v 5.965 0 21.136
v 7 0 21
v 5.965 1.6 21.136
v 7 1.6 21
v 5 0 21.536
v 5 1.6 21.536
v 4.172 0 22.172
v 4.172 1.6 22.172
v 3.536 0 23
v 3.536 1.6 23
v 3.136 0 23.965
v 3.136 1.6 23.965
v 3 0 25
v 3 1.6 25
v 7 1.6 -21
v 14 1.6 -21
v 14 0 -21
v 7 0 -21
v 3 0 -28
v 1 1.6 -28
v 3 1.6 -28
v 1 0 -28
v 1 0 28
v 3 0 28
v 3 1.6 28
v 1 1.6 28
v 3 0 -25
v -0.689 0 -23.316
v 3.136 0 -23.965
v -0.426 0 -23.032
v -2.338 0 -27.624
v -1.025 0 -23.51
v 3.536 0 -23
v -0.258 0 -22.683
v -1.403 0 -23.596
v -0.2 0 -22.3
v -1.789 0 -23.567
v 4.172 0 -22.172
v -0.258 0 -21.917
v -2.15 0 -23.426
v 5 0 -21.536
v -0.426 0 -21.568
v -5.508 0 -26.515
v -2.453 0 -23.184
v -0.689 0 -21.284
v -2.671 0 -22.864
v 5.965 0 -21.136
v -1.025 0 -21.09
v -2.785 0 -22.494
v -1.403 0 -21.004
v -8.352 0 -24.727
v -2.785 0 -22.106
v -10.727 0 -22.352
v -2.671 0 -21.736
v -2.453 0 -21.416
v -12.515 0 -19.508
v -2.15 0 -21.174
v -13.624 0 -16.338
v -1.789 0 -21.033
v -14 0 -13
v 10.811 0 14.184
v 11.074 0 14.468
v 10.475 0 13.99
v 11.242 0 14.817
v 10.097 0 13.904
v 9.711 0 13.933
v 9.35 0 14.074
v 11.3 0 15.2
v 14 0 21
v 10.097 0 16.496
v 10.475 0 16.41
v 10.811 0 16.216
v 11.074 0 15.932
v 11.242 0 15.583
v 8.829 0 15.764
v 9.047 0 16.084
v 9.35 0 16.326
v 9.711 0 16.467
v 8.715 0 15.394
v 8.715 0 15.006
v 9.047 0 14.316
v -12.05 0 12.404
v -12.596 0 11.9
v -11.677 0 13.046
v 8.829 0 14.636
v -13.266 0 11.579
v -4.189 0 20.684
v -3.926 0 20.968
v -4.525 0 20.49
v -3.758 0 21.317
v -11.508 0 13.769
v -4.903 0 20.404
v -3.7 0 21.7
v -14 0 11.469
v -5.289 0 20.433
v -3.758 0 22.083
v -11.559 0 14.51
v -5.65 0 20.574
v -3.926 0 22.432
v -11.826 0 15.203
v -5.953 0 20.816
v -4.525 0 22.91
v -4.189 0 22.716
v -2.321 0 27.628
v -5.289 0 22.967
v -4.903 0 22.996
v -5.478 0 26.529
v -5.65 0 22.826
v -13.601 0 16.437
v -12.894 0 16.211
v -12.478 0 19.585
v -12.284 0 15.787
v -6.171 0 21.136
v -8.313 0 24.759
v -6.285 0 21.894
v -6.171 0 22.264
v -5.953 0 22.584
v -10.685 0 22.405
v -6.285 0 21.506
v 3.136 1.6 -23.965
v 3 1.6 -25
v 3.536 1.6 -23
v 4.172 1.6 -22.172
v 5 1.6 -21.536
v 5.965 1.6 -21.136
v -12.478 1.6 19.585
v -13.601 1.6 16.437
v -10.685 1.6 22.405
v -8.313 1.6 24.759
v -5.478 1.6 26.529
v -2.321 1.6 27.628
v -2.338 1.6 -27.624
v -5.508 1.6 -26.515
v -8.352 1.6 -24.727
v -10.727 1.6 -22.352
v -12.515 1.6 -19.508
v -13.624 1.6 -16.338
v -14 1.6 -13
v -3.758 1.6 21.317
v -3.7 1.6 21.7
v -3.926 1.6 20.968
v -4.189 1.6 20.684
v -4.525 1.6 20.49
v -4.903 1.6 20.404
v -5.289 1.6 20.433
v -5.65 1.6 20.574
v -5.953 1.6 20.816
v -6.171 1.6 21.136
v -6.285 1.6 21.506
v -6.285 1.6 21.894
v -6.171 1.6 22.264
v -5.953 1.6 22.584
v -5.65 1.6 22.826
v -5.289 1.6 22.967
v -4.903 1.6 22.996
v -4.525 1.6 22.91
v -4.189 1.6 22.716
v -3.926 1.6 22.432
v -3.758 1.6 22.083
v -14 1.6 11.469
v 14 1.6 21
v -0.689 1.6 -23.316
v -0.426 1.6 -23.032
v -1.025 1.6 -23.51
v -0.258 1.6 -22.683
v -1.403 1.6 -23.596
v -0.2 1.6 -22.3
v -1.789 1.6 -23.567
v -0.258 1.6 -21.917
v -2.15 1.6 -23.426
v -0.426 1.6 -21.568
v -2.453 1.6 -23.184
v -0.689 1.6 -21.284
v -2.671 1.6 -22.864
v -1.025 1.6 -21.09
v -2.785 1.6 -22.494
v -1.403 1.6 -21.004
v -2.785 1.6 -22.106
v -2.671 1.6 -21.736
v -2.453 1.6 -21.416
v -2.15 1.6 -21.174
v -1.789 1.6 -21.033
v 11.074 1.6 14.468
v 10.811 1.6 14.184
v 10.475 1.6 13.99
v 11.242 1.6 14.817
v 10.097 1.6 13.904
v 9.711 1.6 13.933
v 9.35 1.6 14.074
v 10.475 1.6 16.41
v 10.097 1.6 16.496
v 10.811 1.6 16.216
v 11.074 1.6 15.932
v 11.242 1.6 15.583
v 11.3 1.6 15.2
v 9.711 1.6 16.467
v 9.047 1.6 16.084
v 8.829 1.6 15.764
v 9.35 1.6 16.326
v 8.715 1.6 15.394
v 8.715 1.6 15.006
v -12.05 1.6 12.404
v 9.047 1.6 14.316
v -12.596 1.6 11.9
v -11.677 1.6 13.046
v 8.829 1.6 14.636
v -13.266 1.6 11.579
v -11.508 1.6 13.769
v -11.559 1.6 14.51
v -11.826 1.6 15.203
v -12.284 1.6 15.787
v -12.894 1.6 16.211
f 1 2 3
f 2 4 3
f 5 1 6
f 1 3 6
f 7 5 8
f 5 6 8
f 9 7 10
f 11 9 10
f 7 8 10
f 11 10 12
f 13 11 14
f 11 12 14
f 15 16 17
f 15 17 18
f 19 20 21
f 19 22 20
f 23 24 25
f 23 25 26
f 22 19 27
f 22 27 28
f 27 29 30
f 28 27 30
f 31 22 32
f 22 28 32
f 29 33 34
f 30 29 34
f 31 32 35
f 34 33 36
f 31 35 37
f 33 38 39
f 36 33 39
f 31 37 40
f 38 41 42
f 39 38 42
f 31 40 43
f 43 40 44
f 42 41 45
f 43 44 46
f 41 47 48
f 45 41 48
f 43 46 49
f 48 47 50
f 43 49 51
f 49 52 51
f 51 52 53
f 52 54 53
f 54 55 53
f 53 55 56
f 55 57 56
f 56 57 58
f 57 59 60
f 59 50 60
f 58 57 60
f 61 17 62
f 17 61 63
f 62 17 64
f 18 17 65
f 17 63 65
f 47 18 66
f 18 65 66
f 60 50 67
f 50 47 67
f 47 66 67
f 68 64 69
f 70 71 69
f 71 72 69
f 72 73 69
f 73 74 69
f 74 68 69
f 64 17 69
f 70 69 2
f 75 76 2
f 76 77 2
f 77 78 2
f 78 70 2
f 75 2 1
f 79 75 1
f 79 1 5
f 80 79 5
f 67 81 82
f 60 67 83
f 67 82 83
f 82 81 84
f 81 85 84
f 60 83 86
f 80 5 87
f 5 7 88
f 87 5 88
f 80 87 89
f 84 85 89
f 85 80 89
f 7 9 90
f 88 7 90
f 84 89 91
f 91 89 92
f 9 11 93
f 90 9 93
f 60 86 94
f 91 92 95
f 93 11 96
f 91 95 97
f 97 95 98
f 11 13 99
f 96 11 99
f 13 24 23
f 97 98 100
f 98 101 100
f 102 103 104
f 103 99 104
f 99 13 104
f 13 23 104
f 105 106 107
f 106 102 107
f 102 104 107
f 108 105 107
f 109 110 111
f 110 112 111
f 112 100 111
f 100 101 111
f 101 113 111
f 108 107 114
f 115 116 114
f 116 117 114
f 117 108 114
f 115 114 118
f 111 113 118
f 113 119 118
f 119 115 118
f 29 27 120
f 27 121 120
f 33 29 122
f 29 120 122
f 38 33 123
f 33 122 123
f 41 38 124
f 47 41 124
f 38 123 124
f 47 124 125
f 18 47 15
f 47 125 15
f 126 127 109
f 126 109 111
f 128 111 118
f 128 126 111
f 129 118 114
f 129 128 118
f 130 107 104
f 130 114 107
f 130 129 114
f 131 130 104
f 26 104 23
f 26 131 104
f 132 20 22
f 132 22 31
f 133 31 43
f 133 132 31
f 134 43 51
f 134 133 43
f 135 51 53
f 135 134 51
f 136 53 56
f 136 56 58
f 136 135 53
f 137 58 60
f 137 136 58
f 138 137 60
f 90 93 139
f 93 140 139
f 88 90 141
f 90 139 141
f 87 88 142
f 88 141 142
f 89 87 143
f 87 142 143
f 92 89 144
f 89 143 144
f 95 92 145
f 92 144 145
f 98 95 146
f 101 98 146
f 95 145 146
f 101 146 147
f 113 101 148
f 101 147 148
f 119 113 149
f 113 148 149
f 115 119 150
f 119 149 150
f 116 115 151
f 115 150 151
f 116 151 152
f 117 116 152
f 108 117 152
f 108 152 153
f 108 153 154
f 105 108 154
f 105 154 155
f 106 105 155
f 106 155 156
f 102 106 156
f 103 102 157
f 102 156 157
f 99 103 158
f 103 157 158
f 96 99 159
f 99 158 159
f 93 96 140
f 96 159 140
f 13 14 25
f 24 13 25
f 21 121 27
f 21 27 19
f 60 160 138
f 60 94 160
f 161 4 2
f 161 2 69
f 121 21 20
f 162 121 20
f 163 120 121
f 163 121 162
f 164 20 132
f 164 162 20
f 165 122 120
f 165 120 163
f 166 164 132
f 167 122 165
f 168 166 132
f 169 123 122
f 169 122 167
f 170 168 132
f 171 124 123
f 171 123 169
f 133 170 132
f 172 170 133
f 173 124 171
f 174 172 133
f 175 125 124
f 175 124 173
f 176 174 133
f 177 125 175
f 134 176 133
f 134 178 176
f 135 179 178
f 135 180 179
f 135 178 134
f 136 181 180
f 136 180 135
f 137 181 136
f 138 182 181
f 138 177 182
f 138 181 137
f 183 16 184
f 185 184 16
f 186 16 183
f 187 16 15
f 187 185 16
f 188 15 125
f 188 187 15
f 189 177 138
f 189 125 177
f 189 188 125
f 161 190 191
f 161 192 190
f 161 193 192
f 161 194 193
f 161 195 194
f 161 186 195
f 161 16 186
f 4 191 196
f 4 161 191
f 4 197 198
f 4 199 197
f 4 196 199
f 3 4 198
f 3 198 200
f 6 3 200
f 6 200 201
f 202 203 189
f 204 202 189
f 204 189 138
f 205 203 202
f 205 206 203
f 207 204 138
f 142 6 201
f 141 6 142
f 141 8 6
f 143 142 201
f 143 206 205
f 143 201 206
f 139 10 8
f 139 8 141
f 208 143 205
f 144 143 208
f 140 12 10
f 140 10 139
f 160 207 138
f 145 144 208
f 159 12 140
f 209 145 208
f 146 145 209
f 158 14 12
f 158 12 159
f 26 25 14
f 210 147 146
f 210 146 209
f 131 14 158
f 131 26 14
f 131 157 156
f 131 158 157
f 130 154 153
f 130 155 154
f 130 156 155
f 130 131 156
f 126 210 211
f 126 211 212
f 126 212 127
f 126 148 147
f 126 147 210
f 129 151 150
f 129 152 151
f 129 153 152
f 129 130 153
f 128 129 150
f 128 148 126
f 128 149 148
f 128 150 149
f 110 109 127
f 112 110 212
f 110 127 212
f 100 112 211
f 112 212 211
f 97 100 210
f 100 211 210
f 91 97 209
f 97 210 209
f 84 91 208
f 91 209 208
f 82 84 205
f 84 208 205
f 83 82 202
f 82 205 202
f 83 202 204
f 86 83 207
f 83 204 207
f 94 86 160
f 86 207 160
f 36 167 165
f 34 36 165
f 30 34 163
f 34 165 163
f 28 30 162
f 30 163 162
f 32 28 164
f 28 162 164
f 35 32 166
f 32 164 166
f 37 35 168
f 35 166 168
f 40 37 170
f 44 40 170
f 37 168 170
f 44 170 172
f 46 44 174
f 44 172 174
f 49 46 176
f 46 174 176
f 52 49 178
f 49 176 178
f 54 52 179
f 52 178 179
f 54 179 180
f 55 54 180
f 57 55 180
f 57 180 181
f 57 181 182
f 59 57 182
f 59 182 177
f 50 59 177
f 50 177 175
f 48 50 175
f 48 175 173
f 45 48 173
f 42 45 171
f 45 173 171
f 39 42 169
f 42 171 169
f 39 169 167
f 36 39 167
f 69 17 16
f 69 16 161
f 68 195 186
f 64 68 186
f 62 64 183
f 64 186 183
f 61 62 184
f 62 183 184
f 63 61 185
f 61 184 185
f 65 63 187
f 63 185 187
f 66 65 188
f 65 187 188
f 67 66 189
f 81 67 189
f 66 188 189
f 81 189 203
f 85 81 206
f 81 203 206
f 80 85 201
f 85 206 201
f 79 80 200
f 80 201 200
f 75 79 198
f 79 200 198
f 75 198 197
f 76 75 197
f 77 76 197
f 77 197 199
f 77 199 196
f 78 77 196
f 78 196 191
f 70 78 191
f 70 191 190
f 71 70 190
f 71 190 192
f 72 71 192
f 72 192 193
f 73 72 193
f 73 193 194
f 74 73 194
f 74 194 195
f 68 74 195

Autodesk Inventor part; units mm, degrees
ref_plane "YZ Plane" through (0, 0, 0) normal (1, 0, 0) x (0, 1, 0)
ref_plane "XZ Plane" through (0, 0, 0) normal (0, 1, 0) x (-1, 0, 0)
ref_plane "XY Plane" through (0, 0, 0) normal (0, 0, 1) x (1, 0, 0)
sketch "Esquisse1" plane through (0, 0, 0) normal (0, 1, 0) x (-1, 0, 0)
  line L0 (14, -28) -> (-14, -28)
  line L1 (-14, -28) -> (-14, 28)
  line L2 (-14, 28) -> (14, 28)
  line L3 (14, 28) -> (14, -28)
  point P0 (0, 0)
  dimension "d0" = 28
  dimension "d1" = 56
  dimension "d2" = 28
  dimension "d3" = 14
extrude "Extrusion1" add sketch "Esquisse1" along normal blind 1.6
fillet "Congé1" radius 15 2 edges at (-14, 0.8, -28) (-14, 0.8, 28)
sketch "Esquisse2" plane through (0, 1.6, 0) normal (0, 1, 0) x (1, 0, 0)
  circle A0 centre (7, 25) radius 4
  circle A1 centre (7, -25) radius 4
  line L0 (1, -28) -> (14, -28) projected
  line L1 (3, 25) -> (3, 28)
  line L2 (14, 28) -> (1, 28) projected
  line L3 (4.3542, 28) -> (3, 28)
  line L4 (9.6458, 28) -> (14, 28)
  line L5 (14, 28) -> (14, 21)
  line L6 (14, -28) -> (14, 28) projected
  line L7 (14, 21) -> (7, 21)
  line L8 (7, -21) -> (14, -21)
  line L9 (14, -21) -> (14, -28)
  line L10 (14, -28) -> (9.6458, -28)
  line L11 (3, -25) -> (3, -28)
  line L12 (3, -28) -> (4.3542, -28)
  point P0 (0, 0)
  dimension "d7" = 8
  dimension "d8" = 7
  dimension "d9" = 7
  dimension "d10" = 25
  dimension "d11" = 25
extrude "Extrusion3" cut sketch "Esquisse2" against normal through all contours A0 L2 | A0 L2 L5 L7 | L6 L0 A1 L8 | A0 L1 L2 | A1 L0 | A1 L0 L11 picked at (8.3035, 24.6872) picked at (8.2117, -25.5325)
sketch "Esquisse3" plane through (0, 1.6, 0) normal (0, 1, 0) x (1, 0, 0)
  circle A0 centre (-5, -21.7) radius 1.3
  line L0 (-14, 13) -> (-14, -13) projected
  circle A1 centre (-1.5, 22.3) radius 1.3
  circle A2 centre (10, -15.2) radius 1.3
  point P0 (0, 0)
  dimension "d21" = 2.6
  dimension "d23" = 9
  dimension "d30" = 21.7
  dimension "d31" = 2.6
  dimension "d32" = 12.5
  dimension "d33" = 9.3
  dimension "d34" = 2.6
  dimension "d35" = 6.5
  dimension "d36" = 15
extrude "Extrusion4" cut sketch "Esquisse3" against normal through all
sketch "Esquisse4" plane through (0, 1.6, 0) normal (0, 1, 0) x (1, 0, 0)
  circle A0 centre (-14, -13.969) radius 2.5
  line L0 (14, -21) -> (14, 21) projected
  line L1 (7, -21) -> (14, -21) projected
  point P0 (0, 0)
  dimension "d37" = 5
  dimension "d38" = 28
  dimension "d39" = 7.031
extrude "Extrusion5" cut sketch "Esquisse4" against normal through all
equation "\"d2\" = 0.5 * d1"
equation "\"d3\" = 0.5 * d0"
equation "\"d9\" = d8"
equation "\"d11\" = d10"
equation "\"d31\" = d21"
equation "\"d34\" = d21"
properties part number "PCB Gauche" material "Nylon, disulfure de molybdène"
